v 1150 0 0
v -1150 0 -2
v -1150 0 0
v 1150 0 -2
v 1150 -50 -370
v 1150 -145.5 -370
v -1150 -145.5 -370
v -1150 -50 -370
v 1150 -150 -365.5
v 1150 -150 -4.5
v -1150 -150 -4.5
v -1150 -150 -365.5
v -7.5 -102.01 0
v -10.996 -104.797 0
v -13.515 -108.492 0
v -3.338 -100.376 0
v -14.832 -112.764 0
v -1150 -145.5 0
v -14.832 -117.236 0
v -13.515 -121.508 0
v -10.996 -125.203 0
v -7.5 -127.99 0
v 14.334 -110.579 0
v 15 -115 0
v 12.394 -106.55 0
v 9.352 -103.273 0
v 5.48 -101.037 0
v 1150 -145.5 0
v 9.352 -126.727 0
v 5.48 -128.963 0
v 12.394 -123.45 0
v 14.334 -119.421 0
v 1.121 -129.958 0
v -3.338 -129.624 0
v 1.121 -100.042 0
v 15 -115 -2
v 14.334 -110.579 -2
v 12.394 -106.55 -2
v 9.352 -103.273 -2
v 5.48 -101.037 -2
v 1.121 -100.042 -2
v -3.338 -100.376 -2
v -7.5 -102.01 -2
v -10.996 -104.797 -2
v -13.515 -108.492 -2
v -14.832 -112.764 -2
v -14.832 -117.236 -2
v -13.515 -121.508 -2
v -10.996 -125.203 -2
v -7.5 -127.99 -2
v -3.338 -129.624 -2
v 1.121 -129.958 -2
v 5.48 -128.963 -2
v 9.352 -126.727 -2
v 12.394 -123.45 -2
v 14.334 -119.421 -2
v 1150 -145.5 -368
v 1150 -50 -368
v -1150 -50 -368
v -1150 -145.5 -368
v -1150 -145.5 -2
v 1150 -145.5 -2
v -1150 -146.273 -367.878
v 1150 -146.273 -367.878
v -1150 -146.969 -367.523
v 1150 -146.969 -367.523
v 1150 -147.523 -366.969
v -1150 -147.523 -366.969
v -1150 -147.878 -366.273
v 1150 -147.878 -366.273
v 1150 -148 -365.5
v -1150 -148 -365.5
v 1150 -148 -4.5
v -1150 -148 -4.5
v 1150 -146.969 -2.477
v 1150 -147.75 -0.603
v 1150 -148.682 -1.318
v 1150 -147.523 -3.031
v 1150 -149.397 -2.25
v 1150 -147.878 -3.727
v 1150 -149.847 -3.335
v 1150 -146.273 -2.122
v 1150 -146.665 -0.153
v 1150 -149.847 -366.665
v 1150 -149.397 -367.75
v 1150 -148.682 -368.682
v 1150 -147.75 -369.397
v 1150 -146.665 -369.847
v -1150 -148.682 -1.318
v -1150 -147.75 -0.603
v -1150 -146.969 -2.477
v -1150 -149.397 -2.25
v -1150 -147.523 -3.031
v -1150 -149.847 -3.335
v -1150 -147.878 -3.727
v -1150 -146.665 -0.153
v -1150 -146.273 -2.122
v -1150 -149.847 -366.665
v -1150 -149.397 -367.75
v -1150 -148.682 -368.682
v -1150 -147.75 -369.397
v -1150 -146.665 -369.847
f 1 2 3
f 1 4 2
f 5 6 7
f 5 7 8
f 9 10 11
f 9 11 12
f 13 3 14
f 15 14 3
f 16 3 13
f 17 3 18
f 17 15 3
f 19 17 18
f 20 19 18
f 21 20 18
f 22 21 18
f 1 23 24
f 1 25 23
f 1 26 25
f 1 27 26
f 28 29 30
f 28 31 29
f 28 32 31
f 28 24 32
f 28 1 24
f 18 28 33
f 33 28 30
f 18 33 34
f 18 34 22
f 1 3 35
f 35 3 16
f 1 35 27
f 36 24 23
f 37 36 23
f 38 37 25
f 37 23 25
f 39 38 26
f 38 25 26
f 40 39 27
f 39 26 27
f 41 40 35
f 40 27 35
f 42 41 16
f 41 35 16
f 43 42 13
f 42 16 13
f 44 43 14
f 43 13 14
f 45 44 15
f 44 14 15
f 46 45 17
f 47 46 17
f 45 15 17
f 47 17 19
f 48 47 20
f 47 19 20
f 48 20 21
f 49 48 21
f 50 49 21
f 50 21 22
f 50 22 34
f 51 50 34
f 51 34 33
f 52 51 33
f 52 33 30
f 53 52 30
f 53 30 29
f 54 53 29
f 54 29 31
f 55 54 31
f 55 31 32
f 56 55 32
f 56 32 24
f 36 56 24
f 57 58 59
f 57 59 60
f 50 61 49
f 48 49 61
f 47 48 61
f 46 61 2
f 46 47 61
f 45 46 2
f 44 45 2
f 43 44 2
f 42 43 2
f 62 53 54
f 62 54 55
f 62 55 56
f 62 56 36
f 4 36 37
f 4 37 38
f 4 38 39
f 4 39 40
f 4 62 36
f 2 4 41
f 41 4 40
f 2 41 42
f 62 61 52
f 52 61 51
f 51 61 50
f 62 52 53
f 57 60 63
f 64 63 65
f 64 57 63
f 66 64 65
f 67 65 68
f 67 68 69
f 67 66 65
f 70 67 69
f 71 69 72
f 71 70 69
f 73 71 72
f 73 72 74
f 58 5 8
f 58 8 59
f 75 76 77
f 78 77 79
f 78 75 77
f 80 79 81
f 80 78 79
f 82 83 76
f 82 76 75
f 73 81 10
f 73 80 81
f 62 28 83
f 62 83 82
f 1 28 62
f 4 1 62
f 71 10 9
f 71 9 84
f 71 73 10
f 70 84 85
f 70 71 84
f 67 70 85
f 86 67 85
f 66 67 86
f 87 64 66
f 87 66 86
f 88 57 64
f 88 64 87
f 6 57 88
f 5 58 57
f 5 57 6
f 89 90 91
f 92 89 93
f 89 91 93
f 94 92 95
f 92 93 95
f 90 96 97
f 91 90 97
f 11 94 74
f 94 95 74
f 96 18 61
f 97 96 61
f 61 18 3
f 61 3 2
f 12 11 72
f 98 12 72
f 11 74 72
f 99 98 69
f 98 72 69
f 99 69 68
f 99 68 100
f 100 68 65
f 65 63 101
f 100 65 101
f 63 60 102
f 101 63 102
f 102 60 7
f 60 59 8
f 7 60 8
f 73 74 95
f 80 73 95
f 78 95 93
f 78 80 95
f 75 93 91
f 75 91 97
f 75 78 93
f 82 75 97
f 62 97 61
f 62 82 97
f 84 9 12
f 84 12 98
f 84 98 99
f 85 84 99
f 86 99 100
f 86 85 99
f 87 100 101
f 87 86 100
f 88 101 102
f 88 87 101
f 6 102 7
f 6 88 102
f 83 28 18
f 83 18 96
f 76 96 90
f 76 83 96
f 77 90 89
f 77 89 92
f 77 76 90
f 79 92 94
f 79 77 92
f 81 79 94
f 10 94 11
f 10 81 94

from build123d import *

# Parameters (mm, degrees)
BASE_FLANGE1_DEPTH = 1150
SKETCH2_R          = 15
CUT_EXTRUDE1_DEPTH = 10


# Sheet-metal steps are written as plain solids
with BuildPart() as part:
    # Sketch1 → Base-Flange1 (new, symmetric)
    with BuildSketch(Plane(origin=(0, 0, 0), x_dir=(0, 0, -1), z_dir=(1, 0, 0))):
        with BuildLine():
            Line((0, 0), (0, -145.5))
            ThreePointArc((0, -145.5), (1.318019485, -148.681980515), (4.5, -150))
            Line((4.5, -150), (365.5, -150))
            ThreePointArc((365.5, -150), (368.681980515, -148.681980515), (370, -145.5))
            Line((370, -145.5), (370, -50))
            Line((370, -50), (368, -50))
            Line((368, -50), (368, -145.5))
            ThreePointArc((368, -145.5), (367.267766953, -147.267766953), (365.5, -148))
            Line((365.5, -148), (4.5, -148))
            ThreePointArc((4.5, -148), (2.732233047, -147.267766953), (2, -145.5))
            Line((2, -145.5), (2, 0))
            Line((2, 0), (0, 0))
        make_face()
    extrude(amount=BASE_FLANGE1_DEPTH, both=True)

    # Sketch2 → Cut-Extrude1 (cut)
    with BuildSketch(Plane.XY):
        with Locations((0, -115)):
            Circle(SKETCH2_R)
    extrude(amount=-CUT_EXTRUDE1_DEPTH, mode=Mode.SUBTRACT)


solid = part.part
